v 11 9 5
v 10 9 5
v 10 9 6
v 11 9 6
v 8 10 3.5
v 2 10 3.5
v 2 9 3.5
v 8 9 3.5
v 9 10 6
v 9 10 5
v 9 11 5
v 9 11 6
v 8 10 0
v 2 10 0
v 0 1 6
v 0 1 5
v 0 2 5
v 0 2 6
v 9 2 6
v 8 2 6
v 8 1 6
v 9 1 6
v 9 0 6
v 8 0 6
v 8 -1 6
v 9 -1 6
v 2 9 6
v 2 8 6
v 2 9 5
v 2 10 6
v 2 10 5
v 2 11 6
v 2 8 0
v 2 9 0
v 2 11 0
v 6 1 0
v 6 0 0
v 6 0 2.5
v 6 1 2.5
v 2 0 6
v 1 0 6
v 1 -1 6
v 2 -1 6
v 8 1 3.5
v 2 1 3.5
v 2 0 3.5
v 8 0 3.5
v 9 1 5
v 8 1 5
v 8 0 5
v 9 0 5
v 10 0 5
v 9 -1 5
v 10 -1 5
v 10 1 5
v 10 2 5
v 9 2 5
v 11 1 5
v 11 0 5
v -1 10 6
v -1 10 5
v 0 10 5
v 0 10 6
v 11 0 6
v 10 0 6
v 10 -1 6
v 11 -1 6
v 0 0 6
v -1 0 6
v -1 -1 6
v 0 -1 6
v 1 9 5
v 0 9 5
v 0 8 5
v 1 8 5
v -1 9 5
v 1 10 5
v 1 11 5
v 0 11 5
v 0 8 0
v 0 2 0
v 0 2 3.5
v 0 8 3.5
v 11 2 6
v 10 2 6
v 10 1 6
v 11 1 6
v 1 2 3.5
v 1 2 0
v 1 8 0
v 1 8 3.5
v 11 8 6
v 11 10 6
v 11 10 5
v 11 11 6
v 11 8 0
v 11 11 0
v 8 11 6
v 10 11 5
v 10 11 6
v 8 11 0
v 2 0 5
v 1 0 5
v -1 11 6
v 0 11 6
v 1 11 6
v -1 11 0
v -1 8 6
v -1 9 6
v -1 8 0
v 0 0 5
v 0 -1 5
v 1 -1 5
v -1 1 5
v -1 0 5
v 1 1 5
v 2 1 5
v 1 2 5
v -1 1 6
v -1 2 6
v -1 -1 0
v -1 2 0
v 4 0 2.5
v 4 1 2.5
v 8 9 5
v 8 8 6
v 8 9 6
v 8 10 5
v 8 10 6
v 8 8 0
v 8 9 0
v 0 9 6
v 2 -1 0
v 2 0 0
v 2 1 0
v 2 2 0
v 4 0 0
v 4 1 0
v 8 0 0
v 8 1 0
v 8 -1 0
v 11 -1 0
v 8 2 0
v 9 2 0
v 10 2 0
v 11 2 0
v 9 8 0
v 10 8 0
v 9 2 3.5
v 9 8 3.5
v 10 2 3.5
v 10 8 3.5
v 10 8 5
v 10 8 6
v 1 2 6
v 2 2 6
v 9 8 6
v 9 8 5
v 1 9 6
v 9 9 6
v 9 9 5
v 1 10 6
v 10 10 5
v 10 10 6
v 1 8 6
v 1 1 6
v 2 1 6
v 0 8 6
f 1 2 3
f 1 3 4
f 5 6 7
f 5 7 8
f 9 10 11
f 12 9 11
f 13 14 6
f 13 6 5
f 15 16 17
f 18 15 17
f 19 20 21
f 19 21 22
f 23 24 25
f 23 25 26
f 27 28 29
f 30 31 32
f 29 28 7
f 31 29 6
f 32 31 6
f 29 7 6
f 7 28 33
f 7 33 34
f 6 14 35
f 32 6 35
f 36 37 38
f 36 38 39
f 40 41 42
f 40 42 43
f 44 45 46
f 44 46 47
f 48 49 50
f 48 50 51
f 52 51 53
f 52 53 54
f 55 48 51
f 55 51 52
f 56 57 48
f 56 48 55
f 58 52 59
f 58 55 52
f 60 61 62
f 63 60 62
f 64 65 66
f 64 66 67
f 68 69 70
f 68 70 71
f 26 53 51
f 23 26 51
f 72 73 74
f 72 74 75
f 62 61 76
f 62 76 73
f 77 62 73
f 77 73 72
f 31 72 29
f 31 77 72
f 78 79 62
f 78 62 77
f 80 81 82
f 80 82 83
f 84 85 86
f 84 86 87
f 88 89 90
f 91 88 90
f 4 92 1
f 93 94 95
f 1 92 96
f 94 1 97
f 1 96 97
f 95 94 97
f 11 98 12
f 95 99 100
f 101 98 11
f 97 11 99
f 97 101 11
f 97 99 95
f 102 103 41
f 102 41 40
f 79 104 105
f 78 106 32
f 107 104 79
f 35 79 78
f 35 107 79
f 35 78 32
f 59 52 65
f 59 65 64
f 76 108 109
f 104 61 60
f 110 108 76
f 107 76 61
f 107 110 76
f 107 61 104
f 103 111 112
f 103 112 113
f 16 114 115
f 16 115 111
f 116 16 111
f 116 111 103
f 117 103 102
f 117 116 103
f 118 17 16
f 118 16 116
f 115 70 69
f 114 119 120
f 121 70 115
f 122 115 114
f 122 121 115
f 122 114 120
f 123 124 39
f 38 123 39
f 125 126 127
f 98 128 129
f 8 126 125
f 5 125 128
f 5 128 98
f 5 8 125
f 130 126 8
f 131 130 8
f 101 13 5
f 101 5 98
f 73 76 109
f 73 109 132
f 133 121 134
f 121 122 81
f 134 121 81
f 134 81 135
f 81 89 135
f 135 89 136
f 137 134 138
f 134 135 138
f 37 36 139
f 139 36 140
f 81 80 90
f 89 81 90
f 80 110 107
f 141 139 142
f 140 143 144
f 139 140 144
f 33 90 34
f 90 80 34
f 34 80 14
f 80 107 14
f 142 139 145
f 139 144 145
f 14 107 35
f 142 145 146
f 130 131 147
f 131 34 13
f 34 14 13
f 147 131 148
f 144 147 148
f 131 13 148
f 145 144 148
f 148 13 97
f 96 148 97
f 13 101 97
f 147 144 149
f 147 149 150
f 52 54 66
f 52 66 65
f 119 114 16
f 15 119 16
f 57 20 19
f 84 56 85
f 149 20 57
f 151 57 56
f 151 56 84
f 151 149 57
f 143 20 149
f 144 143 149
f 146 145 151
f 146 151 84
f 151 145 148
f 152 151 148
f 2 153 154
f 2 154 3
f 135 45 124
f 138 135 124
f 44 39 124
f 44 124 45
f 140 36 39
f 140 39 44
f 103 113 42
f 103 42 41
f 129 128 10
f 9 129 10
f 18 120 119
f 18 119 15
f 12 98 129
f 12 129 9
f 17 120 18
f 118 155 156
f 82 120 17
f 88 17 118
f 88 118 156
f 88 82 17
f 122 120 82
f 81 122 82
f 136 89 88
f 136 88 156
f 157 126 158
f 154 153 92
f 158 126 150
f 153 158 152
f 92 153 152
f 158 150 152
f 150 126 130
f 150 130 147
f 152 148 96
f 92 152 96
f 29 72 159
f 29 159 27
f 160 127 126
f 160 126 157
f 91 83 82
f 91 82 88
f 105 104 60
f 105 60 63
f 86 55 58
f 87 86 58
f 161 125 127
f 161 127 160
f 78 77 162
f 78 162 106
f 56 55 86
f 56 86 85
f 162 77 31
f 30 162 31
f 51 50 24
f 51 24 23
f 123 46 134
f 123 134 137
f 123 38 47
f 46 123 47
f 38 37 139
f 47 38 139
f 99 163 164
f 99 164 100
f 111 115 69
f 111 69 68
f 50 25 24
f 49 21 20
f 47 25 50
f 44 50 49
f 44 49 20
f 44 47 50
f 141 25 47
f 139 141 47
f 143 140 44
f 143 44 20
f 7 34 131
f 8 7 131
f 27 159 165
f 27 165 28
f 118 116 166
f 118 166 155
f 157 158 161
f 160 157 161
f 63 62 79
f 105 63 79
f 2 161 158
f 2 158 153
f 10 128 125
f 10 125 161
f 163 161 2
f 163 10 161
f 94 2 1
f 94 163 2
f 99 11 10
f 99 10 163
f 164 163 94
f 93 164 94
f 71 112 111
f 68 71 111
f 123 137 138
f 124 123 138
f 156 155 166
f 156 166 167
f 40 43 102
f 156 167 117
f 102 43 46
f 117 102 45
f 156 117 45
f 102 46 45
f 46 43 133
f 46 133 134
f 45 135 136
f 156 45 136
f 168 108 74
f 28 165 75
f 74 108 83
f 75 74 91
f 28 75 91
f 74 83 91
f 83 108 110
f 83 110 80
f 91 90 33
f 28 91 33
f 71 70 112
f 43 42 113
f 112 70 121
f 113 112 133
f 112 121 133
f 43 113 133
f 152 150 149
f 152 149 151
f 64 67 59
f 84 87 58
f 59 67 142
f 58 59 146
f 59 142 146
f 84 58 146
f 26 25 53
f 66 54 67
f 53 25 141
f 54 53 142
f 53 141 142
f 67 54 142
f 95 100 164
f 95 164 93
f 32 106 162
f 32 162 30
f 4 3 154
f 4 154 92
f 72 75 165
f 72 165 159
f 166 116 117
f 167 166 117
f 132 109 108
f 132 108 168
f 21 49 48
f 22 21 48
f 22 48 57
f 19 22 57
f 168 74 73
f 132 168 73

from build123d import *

# Parameters (mm, degrees)
BOX009_W     = 1
BOX009_H     = 1
BOX009_DEPTH = 1
BOX008_W     = 1
BOX008_H     = 1
BOX008_DEPTH = 1
BOX007_W     = 1
BOX007_H     = 1
BOX007_DEPTH = 1
BOX006_W     = 1
BOX006_H     = 1
BOX006_DEPTH = 1
BOX005_W     = 1
BOX005_H     = 1
BOX005_DEPTH = 1
BOX003_W     = 3
BOX003_H     = 3
BOX003_DEPTH = 6
BOX015_W     = 1
BOX015_H     = 1
BOX015_DEPTH = 1
BOX014_W     = 1
BOX014_H     = 1
BOX014_DEPTH = 1
BOX013_W     = 1
BOX013_H     = 1
BOX013_DEPTH = 1
BOX012_W     = 1
BOX012_H     = 1
BOX012_DEPTH = 1
BOX011_W     = 1
BOX011_H     = 1
BOX011_DEPTH = 1
BOX010_W     = 3
BOX010_H     = 3
BOX010_DEPTH = 6
BOX021_W     = 1
BOX021_H     = 1
BOX021_DEPTH = 1
BOX020_W     = 1
BOX020_H     = 1
BOX020_DEPTH = 1
BOX019_W     = 1
BOX019_H     = 1
BOX019_DEPTH = 1
BOX018_W     = 1
BOX018_H     = 1
BOX018_DEPTH = 1
BOX017_W     = 1
BOX017_H     = 1
BOX017_DEPTH = 1
BOX016_W     = 3
BOX016_H     = 3
BOX016_DEPTH = 6
BOX027_W     = 1
BOX027_H     = 1
BOX027_DEPTH = 1
BOX026_W     = 1
BOX026_H     = 1
BOX026_DEPTH = 1
BOX025_W     = 1
BOX025_H     = 1
BOX025_DEPTH = 1
BOX024_W     = 1
BOX024_H     = 1
BOX024_DEPTH = 1
BOX023_W     = 1
BOX023_H     = 1
BOX023_DEPTH = 1
BOX022_W     = 3
BOX022_H     = 3
BOX022_DEPTH = 6
BOX002_W     = 2
BOX002_H     = 10
BOX002_DEPTH = 2.5
BOX001_W     = 8
BOX001_H     = 8
BOX001_DEPTH = 10
BOX_W        = 10
BOX_H        = 10
BOX_DEPTH    = 3.5


with BuildPart() as cubo009:
    # Box009 → Box009 (new body)
    with BuildSketch(Plane(origin=(-2, 1, 5), x_dir=(1, 0, 0), z_dir=(0, 0, 1))):
        with Locations((0.5, 0.5)):
            Rectangle(BOX009_W, BOX009_H)
    extrude(amount=BOX009_DEPTH)


with BuildPart() as cubo008:
    # Box008 → Box008 (new body)
    with BuildSketch(Plane(origin=(-4, 1, 5), x_dir=(1, 0, 0), z_dir=(0, 0, 1))):
        with Locations((0.5, 0.5)):
            Rectangle(BOX008_W, BOX008_H)
    extrude(amount=BOX008_DEPTH)


with BuildPart() as cubo007:
    # Box007 → Box007 (new body)
    with BuildSketch(Plane(origin=(-3, 1, 5), x_dir=(1, 0, 0), z_dir=(0, 0, 1))):
        with Locations((0.5, 0.5)):
            Rectangle(BOX007_W, BOX007_H)
    extrude(amount=BOX007_DEPTH)


with BuildPart() as cubo006:
    # Box006 → Box006 (new body)
    with BuildSketch(Plane(origin=(-3, 2, 5), x_dir=(1, 0, 0), z_dir=(0, 0, 1))):
        with Locations((0.5, 0.5)):
            Rectangle(BOX006_W, BOX006_H)
    extrude(amount=BOX006_DEPTH)


with BuildPart() as cubo005:
    # Box005 → Box005 (new body)
    with BuildSketch(Plane(origin=(-3, 0, 5), x_dir=(1, 0, 0), z_dir=(0, 0, 1))):
        with Locations((0.5, 0.5)):
            Rectangle(BOX005_W, BOX005_H)
    extrude(amount=BOX005_DEPTH)


with BuildPart() as cut006:
    # Box003 → Box003 (new body)
    with BuildSketch(Plane(origin=(-4, 0, 0), x_dir=(1, 0, 0), z_dir=(0, 0, 1))):
        with Locations((1.5, 1.5)):
            Rectangle(BOX003_W, BOX003_H)
    extrude(amount=BOX003_DEPTH)

    # Cut002: cut Cubo005
    add(cubo005.part, mode=Mode.SUBTRACT)

    # Cut003: cut Cubo006
    add(cubo006.part, mode=Mode.SUBTRACT)

    # Cut004: cut Cubo007
    add(cubo007.part, mode=Mode.SUBTRACT)

    # Cut005: cut Cubo008
    add(cubo008.part, mode=Mode.SUBTRACT)

    # Cut006: cut Cubo009
    add(cubo009.part, mode=Mode.SUBTRACT)


with BuildPart() as cut006_1:
    # Cut006 placement: moved
    add(cut006.part.moved(Location((12, -1, 0))))


with BuildPart() as cubo015:
    # Box015 → Box015 (new body)
    with BuildSketch(Plane(origin=(-2, 1, 5), x_dir=(1, 0, 0), z_dir=(0, 0, 1))):
        with Locations((0.5, 0.5)):
            Rectangle(BOX015_W, BOX015_H)
    extrude(amount=BOX015_DEPTH)


with BuildPart() as cubo014:
    # Box014 → Box014 (new body)
    with BuildSketch(Plane(origin=(-4, 1, 5), x_dir=(1, 0, 0), z_dir=(0, 0, 1))):
        with Locations((0.5, 0.5)):
            Rectangle(BOX014_W, BOX014_H)
    extrude(amount=BOX014_DEPTH)


with BuildPart() as cubo013:
    # Box013 → Box013 (new body)
    with BuildSketch(Plane(origin=(-3, 1, 5), x_dir=(1, 0, 0), z_dir=(0, 0, 1))):
        with Locations((0.5, 0.5)):
            Rectangle(BOX013_W, BOX013_H)
    extrude(amount=BOX013_DEPTH)


with BuildPart() as cubo012:
    # Box012 → Box012 (new body)
    with BuildSketch(Plane(origin=(-3, 2, 5), x_dir=(1, 0, 0), z_dir=(0, 0, 1))):
        with Locations((0.5, 0.5)):
            Rectangle(BOX012_W, BOX012_H)
    extrude(amount=BOX012_DEPTH)


with BuildPart() as cubo011:
    # Box011 → Box011 (new body)
    with BuildSketch(Plane(origin=(-3, 0, 5), x_dir=(1, 0, 0), z_dir=(0, 0, 1))):
        with Locations((0.5, 0.5)):
            Rectangle(BOX011_W, BOX011_H)
    extrude(amount=BOX011_DEPTH)


with BuildPart() as cut011:
    # Box010 → Box010 (new body)
    with BuildSketch(Plane(origin=(-4, 0, 0), x_dir=(1, 0, 0), z_dir=(0, 0, 1))):
        with Locations((1.5, 1.5)):
            Rectangle(BOX010_W, BOX010_H)
    extrude(amount=BOX010_DEPTH)

    # Cut007: cut Cubo011
    add(cubo011.part, mode=Mode.SUBTRACT)

    # Cut008: cut Cubo012
    add(cubo012.part, mode=Mode.SUBTRACT)

    # Cut009: cut Cubo013
    add(cubo013.part, mode=Mode.SUBTRACT)

    # Cut010: cut Cubo014
    add(cubo014.part, mode=Mode.SUBTRACT)

    # Cut011: cut Cubo015
    add(cubo015.part, mode=Mode.SUBTRACT)


with BuildPart() as cut011_1:
    # Cut011 placement: moved
    add(cut011.part.moved(Location((3, -1, 0))))


with BuildPart() as cubo021:
    # Box021 → Box021 (new body)
    with BuildSketch(Plane(origin=(-2, 1, 5), x_dir=(1, 0, 0), z_dir=(0, 0, 1))):
        with Locations((0.5, 0.5)):
            Rectangle(BOX021_W, BOX021_H)
    extrude(amount=BOX021_DEPTH)


with BuildPart() as cubo020:
    # Box020 → Box020 (new body)
    with BuildSketch(Plane(origin=(-4, 1, 5), x_dir=(1, 0, 0), z_dir=(0, 0, 1))):
        with Locations((0.5, 0.5)):
            Rectangle(BOX020_W, BOX020_H)
    extrude(amount=BOX020_DEPTH)


with BuildPart() as cubo019:
    # Box019 → Box019 (new body)
    with BuildSketch(Plane(origin=(-3, 1, 5), x_dir=(1, 0, 0), z_dir=(0, 0, 1))):
        with Locations((0.5, 0.5)):
            Rectangle(BOX019_W, BOX019_H)
    extrude(amount=BOX019_DEPTH)


with BuildPart() as cubo018:
    # Box018 → Box018 (new body)
    with BuildSketch(Plane(origin=(-3, 2, 5), x_dir=(1, 0, 0), z_dir=(0, 0, 1))):
        with Locations((0.5, 0.5)):
            Rectangle(BOX018_W, BOX018_H)
    extrude(amount=BOX018_DEPTH)


with BuildPart() as cubo017:
    # Box017 → Box017 (new body)
    with BuildSketch(Plane(origin=(-3, 0, 5), x_dir=(1, 0, 0), z_dir=(0, 0, 1))):
        with Locations((0.5, 0.5)):
            Rectangle(BOX017_W, BOX017_H)
    extrude(amount=BOX017_DEPTH)


with BuildPart() as cut016:
    # Box016 → Box016 (new body)
    with BuildSketch(Plane(origin=(-4, 0, 0), x_dir=(1, 0, 0), z_dir=(0, 0, 1))):
        with Locations((1.5, 1.5)):
            Rectangle(BOX016_W, BOX016_H)
    extrude(amount=BOX016_DEPTH)

    # Cut012: cut Cubo017
    add(cubo017.part, mode=Mode.SUBTRACT)

    # Cut013: cut Cubo018
    add(cubo018.part, mode=Mode.SUBTRACT)

    # Cut014: cut Cubo019
    add(cubo019.part, mode=Mode.SUBTRACT)

    # Cut015: cut Cubo020
    add(cubo020.part, mode=Mode.SUBTRACT)

    # Cut016: cut Cubo021
    add(cubo021.part, mode=Mode.SUBTRACT)


with BuildPart() as cut016_1:
    # Cut016 placement: moved
    add(cut016.part.moved(Location((3, 8, 0))))


with BuildPart() as cubo027:
    # Box027 → Box027 (new body)
    with BuildSketch(Plane(origin=(-2, 1, 5), x_dir=(1, 0, 0), z_dir=(0, 0, 1))):
        with Locations((0.5, 0.5)):
            Rectangle(BOX027_W, BOX027_H)
    extrude(amount=BOX027_DEPTH)


with BuildPart() as cubo026:
    # Box026 → Box026 (new body)
    with BuildSketch(Plane(origin=(-4, 1, 5), x_dir=(1, 0, 0), z_dir=(0, 0, 1))):
        with Locations((0.5, 0.5)):
            Rectangle(BOX026_W, BOX026_H)
    extrude(amount=BOX026_DEPTH)


with BuildPart() as cubo025:
    # Box025 → Box025 (new body)
    with BuildSketch(Plane(origin=(-3, 1, 5), x_dir=(1, 0, 0), z_dir=(0, 0, 1))):
        with Locations((0.5, 0.5)):
            Rectangle(BOX025_W, BOX025_H)
    extrude(amount=BOX025_DEPTH)


with BuildPart() as cubo024:
    # Box024 → Box024 (new body)
    with BuildSketch(Plane(origin=(-3, 2, 5), x_dir=(1, 0, 0), z_dir=(0, 0, 1))):
        with Locations((0.5, 0.5)):
            Rectangle(BOX024_W, BOX024_H)
    extrude(amount=BOX024_DEPTH)


with BuildPart() as cubo023:
    # Box023 → Box023 (new body)
    with BuildSketch(Plane(origin=(-3, 0, 5), x_dir=(1, 0, 0), z_dir=(0, 0, 1))):
        with Locations((0.5, 0.5)):
            Rectangle(BOX023_W, BOX023_H)
    extrude(amount=BOX023_DEPTH)


with BuildPart() as cut021:
    # Box022 → Box022 (new body)
    with BuildSketch(Plane(origin=(-4, 0, 0), x_dir=(1, 0, 0), z_dir=(0, 0, 1))):
        with Locations((1.5, 1.5)):
            Rectangle(BOX022_W, BOX022_H)
    extrude(amount=BOX022_DEPTH)

    # Cut017: cut Cubo023
    add(cubo023.part, mode=Mode.SUBTRACT)

    # Cut018: cut Cubo024
    add(cubo024.part, mode=Mode.SUBTRACT)

    # Cut019: cut Cubo025
    add(cubo025.part, mode=Mode.SUBTRACT)

    # Cut020: cut Cubo026
    add(cubo026.part, mode=Mode.SUBTRACT)

    # Cut021: cut Cubo027
    add(cubo027.part, mode=Mode.SUBTRACT)


with BuildPart() as cut021_1:
    # Cut021 placement: moved
    add(cut021.part.moved(Location((12, 8, 0))))


with BuildPart() as cubo002:
    # Box002 → Box002 (new body)
    with BuildSketch(Plane(origin=(4, -3, 0), x_dir=(1, 0, 0), z_dir=(0, 0, 1))):
        with Locations((1, 5)):
            Rectangle(BOX002_W, BOX002_H)
    extrude(amount=BOX002_DEPTH)


with BuildPart() as cubo001:
    # Box001 → Box001 (new body)
    with BuildSketch(Plane(origin=(1, 1, -2), x_dir=(1, 0, 0), z_dir=(0, 0, 1))):
        with Locations((4, 4)):
            Rectangle(BOX001_W, BOX001_H)
    extrude(amount=BOX001_DEPTH)


with BuildPart() as fusion:
    # Box → Box (new body)
    with BuildSketch(Plane.XY):
        with Locations((5, 5)):
            Rectangle(BOX_W, BOX_H)
    extrude(amount=BOX_DEPTH)

    # Cut: cut Cubo001
    add(cubo001.part, mode=Mode.SUBTRACT)

    # Cut001: cut Cubo002
    add(cubo002.part, mode=Mode.SUBTRACT)

    # Fusion: union Cut006, Cut011, Cut016, Cut021
    add(cut006_1.part)
    add(cut011_1.part)
    add(cut016_1.part)
    add(cut021_1.part)


solid = fusion.part
